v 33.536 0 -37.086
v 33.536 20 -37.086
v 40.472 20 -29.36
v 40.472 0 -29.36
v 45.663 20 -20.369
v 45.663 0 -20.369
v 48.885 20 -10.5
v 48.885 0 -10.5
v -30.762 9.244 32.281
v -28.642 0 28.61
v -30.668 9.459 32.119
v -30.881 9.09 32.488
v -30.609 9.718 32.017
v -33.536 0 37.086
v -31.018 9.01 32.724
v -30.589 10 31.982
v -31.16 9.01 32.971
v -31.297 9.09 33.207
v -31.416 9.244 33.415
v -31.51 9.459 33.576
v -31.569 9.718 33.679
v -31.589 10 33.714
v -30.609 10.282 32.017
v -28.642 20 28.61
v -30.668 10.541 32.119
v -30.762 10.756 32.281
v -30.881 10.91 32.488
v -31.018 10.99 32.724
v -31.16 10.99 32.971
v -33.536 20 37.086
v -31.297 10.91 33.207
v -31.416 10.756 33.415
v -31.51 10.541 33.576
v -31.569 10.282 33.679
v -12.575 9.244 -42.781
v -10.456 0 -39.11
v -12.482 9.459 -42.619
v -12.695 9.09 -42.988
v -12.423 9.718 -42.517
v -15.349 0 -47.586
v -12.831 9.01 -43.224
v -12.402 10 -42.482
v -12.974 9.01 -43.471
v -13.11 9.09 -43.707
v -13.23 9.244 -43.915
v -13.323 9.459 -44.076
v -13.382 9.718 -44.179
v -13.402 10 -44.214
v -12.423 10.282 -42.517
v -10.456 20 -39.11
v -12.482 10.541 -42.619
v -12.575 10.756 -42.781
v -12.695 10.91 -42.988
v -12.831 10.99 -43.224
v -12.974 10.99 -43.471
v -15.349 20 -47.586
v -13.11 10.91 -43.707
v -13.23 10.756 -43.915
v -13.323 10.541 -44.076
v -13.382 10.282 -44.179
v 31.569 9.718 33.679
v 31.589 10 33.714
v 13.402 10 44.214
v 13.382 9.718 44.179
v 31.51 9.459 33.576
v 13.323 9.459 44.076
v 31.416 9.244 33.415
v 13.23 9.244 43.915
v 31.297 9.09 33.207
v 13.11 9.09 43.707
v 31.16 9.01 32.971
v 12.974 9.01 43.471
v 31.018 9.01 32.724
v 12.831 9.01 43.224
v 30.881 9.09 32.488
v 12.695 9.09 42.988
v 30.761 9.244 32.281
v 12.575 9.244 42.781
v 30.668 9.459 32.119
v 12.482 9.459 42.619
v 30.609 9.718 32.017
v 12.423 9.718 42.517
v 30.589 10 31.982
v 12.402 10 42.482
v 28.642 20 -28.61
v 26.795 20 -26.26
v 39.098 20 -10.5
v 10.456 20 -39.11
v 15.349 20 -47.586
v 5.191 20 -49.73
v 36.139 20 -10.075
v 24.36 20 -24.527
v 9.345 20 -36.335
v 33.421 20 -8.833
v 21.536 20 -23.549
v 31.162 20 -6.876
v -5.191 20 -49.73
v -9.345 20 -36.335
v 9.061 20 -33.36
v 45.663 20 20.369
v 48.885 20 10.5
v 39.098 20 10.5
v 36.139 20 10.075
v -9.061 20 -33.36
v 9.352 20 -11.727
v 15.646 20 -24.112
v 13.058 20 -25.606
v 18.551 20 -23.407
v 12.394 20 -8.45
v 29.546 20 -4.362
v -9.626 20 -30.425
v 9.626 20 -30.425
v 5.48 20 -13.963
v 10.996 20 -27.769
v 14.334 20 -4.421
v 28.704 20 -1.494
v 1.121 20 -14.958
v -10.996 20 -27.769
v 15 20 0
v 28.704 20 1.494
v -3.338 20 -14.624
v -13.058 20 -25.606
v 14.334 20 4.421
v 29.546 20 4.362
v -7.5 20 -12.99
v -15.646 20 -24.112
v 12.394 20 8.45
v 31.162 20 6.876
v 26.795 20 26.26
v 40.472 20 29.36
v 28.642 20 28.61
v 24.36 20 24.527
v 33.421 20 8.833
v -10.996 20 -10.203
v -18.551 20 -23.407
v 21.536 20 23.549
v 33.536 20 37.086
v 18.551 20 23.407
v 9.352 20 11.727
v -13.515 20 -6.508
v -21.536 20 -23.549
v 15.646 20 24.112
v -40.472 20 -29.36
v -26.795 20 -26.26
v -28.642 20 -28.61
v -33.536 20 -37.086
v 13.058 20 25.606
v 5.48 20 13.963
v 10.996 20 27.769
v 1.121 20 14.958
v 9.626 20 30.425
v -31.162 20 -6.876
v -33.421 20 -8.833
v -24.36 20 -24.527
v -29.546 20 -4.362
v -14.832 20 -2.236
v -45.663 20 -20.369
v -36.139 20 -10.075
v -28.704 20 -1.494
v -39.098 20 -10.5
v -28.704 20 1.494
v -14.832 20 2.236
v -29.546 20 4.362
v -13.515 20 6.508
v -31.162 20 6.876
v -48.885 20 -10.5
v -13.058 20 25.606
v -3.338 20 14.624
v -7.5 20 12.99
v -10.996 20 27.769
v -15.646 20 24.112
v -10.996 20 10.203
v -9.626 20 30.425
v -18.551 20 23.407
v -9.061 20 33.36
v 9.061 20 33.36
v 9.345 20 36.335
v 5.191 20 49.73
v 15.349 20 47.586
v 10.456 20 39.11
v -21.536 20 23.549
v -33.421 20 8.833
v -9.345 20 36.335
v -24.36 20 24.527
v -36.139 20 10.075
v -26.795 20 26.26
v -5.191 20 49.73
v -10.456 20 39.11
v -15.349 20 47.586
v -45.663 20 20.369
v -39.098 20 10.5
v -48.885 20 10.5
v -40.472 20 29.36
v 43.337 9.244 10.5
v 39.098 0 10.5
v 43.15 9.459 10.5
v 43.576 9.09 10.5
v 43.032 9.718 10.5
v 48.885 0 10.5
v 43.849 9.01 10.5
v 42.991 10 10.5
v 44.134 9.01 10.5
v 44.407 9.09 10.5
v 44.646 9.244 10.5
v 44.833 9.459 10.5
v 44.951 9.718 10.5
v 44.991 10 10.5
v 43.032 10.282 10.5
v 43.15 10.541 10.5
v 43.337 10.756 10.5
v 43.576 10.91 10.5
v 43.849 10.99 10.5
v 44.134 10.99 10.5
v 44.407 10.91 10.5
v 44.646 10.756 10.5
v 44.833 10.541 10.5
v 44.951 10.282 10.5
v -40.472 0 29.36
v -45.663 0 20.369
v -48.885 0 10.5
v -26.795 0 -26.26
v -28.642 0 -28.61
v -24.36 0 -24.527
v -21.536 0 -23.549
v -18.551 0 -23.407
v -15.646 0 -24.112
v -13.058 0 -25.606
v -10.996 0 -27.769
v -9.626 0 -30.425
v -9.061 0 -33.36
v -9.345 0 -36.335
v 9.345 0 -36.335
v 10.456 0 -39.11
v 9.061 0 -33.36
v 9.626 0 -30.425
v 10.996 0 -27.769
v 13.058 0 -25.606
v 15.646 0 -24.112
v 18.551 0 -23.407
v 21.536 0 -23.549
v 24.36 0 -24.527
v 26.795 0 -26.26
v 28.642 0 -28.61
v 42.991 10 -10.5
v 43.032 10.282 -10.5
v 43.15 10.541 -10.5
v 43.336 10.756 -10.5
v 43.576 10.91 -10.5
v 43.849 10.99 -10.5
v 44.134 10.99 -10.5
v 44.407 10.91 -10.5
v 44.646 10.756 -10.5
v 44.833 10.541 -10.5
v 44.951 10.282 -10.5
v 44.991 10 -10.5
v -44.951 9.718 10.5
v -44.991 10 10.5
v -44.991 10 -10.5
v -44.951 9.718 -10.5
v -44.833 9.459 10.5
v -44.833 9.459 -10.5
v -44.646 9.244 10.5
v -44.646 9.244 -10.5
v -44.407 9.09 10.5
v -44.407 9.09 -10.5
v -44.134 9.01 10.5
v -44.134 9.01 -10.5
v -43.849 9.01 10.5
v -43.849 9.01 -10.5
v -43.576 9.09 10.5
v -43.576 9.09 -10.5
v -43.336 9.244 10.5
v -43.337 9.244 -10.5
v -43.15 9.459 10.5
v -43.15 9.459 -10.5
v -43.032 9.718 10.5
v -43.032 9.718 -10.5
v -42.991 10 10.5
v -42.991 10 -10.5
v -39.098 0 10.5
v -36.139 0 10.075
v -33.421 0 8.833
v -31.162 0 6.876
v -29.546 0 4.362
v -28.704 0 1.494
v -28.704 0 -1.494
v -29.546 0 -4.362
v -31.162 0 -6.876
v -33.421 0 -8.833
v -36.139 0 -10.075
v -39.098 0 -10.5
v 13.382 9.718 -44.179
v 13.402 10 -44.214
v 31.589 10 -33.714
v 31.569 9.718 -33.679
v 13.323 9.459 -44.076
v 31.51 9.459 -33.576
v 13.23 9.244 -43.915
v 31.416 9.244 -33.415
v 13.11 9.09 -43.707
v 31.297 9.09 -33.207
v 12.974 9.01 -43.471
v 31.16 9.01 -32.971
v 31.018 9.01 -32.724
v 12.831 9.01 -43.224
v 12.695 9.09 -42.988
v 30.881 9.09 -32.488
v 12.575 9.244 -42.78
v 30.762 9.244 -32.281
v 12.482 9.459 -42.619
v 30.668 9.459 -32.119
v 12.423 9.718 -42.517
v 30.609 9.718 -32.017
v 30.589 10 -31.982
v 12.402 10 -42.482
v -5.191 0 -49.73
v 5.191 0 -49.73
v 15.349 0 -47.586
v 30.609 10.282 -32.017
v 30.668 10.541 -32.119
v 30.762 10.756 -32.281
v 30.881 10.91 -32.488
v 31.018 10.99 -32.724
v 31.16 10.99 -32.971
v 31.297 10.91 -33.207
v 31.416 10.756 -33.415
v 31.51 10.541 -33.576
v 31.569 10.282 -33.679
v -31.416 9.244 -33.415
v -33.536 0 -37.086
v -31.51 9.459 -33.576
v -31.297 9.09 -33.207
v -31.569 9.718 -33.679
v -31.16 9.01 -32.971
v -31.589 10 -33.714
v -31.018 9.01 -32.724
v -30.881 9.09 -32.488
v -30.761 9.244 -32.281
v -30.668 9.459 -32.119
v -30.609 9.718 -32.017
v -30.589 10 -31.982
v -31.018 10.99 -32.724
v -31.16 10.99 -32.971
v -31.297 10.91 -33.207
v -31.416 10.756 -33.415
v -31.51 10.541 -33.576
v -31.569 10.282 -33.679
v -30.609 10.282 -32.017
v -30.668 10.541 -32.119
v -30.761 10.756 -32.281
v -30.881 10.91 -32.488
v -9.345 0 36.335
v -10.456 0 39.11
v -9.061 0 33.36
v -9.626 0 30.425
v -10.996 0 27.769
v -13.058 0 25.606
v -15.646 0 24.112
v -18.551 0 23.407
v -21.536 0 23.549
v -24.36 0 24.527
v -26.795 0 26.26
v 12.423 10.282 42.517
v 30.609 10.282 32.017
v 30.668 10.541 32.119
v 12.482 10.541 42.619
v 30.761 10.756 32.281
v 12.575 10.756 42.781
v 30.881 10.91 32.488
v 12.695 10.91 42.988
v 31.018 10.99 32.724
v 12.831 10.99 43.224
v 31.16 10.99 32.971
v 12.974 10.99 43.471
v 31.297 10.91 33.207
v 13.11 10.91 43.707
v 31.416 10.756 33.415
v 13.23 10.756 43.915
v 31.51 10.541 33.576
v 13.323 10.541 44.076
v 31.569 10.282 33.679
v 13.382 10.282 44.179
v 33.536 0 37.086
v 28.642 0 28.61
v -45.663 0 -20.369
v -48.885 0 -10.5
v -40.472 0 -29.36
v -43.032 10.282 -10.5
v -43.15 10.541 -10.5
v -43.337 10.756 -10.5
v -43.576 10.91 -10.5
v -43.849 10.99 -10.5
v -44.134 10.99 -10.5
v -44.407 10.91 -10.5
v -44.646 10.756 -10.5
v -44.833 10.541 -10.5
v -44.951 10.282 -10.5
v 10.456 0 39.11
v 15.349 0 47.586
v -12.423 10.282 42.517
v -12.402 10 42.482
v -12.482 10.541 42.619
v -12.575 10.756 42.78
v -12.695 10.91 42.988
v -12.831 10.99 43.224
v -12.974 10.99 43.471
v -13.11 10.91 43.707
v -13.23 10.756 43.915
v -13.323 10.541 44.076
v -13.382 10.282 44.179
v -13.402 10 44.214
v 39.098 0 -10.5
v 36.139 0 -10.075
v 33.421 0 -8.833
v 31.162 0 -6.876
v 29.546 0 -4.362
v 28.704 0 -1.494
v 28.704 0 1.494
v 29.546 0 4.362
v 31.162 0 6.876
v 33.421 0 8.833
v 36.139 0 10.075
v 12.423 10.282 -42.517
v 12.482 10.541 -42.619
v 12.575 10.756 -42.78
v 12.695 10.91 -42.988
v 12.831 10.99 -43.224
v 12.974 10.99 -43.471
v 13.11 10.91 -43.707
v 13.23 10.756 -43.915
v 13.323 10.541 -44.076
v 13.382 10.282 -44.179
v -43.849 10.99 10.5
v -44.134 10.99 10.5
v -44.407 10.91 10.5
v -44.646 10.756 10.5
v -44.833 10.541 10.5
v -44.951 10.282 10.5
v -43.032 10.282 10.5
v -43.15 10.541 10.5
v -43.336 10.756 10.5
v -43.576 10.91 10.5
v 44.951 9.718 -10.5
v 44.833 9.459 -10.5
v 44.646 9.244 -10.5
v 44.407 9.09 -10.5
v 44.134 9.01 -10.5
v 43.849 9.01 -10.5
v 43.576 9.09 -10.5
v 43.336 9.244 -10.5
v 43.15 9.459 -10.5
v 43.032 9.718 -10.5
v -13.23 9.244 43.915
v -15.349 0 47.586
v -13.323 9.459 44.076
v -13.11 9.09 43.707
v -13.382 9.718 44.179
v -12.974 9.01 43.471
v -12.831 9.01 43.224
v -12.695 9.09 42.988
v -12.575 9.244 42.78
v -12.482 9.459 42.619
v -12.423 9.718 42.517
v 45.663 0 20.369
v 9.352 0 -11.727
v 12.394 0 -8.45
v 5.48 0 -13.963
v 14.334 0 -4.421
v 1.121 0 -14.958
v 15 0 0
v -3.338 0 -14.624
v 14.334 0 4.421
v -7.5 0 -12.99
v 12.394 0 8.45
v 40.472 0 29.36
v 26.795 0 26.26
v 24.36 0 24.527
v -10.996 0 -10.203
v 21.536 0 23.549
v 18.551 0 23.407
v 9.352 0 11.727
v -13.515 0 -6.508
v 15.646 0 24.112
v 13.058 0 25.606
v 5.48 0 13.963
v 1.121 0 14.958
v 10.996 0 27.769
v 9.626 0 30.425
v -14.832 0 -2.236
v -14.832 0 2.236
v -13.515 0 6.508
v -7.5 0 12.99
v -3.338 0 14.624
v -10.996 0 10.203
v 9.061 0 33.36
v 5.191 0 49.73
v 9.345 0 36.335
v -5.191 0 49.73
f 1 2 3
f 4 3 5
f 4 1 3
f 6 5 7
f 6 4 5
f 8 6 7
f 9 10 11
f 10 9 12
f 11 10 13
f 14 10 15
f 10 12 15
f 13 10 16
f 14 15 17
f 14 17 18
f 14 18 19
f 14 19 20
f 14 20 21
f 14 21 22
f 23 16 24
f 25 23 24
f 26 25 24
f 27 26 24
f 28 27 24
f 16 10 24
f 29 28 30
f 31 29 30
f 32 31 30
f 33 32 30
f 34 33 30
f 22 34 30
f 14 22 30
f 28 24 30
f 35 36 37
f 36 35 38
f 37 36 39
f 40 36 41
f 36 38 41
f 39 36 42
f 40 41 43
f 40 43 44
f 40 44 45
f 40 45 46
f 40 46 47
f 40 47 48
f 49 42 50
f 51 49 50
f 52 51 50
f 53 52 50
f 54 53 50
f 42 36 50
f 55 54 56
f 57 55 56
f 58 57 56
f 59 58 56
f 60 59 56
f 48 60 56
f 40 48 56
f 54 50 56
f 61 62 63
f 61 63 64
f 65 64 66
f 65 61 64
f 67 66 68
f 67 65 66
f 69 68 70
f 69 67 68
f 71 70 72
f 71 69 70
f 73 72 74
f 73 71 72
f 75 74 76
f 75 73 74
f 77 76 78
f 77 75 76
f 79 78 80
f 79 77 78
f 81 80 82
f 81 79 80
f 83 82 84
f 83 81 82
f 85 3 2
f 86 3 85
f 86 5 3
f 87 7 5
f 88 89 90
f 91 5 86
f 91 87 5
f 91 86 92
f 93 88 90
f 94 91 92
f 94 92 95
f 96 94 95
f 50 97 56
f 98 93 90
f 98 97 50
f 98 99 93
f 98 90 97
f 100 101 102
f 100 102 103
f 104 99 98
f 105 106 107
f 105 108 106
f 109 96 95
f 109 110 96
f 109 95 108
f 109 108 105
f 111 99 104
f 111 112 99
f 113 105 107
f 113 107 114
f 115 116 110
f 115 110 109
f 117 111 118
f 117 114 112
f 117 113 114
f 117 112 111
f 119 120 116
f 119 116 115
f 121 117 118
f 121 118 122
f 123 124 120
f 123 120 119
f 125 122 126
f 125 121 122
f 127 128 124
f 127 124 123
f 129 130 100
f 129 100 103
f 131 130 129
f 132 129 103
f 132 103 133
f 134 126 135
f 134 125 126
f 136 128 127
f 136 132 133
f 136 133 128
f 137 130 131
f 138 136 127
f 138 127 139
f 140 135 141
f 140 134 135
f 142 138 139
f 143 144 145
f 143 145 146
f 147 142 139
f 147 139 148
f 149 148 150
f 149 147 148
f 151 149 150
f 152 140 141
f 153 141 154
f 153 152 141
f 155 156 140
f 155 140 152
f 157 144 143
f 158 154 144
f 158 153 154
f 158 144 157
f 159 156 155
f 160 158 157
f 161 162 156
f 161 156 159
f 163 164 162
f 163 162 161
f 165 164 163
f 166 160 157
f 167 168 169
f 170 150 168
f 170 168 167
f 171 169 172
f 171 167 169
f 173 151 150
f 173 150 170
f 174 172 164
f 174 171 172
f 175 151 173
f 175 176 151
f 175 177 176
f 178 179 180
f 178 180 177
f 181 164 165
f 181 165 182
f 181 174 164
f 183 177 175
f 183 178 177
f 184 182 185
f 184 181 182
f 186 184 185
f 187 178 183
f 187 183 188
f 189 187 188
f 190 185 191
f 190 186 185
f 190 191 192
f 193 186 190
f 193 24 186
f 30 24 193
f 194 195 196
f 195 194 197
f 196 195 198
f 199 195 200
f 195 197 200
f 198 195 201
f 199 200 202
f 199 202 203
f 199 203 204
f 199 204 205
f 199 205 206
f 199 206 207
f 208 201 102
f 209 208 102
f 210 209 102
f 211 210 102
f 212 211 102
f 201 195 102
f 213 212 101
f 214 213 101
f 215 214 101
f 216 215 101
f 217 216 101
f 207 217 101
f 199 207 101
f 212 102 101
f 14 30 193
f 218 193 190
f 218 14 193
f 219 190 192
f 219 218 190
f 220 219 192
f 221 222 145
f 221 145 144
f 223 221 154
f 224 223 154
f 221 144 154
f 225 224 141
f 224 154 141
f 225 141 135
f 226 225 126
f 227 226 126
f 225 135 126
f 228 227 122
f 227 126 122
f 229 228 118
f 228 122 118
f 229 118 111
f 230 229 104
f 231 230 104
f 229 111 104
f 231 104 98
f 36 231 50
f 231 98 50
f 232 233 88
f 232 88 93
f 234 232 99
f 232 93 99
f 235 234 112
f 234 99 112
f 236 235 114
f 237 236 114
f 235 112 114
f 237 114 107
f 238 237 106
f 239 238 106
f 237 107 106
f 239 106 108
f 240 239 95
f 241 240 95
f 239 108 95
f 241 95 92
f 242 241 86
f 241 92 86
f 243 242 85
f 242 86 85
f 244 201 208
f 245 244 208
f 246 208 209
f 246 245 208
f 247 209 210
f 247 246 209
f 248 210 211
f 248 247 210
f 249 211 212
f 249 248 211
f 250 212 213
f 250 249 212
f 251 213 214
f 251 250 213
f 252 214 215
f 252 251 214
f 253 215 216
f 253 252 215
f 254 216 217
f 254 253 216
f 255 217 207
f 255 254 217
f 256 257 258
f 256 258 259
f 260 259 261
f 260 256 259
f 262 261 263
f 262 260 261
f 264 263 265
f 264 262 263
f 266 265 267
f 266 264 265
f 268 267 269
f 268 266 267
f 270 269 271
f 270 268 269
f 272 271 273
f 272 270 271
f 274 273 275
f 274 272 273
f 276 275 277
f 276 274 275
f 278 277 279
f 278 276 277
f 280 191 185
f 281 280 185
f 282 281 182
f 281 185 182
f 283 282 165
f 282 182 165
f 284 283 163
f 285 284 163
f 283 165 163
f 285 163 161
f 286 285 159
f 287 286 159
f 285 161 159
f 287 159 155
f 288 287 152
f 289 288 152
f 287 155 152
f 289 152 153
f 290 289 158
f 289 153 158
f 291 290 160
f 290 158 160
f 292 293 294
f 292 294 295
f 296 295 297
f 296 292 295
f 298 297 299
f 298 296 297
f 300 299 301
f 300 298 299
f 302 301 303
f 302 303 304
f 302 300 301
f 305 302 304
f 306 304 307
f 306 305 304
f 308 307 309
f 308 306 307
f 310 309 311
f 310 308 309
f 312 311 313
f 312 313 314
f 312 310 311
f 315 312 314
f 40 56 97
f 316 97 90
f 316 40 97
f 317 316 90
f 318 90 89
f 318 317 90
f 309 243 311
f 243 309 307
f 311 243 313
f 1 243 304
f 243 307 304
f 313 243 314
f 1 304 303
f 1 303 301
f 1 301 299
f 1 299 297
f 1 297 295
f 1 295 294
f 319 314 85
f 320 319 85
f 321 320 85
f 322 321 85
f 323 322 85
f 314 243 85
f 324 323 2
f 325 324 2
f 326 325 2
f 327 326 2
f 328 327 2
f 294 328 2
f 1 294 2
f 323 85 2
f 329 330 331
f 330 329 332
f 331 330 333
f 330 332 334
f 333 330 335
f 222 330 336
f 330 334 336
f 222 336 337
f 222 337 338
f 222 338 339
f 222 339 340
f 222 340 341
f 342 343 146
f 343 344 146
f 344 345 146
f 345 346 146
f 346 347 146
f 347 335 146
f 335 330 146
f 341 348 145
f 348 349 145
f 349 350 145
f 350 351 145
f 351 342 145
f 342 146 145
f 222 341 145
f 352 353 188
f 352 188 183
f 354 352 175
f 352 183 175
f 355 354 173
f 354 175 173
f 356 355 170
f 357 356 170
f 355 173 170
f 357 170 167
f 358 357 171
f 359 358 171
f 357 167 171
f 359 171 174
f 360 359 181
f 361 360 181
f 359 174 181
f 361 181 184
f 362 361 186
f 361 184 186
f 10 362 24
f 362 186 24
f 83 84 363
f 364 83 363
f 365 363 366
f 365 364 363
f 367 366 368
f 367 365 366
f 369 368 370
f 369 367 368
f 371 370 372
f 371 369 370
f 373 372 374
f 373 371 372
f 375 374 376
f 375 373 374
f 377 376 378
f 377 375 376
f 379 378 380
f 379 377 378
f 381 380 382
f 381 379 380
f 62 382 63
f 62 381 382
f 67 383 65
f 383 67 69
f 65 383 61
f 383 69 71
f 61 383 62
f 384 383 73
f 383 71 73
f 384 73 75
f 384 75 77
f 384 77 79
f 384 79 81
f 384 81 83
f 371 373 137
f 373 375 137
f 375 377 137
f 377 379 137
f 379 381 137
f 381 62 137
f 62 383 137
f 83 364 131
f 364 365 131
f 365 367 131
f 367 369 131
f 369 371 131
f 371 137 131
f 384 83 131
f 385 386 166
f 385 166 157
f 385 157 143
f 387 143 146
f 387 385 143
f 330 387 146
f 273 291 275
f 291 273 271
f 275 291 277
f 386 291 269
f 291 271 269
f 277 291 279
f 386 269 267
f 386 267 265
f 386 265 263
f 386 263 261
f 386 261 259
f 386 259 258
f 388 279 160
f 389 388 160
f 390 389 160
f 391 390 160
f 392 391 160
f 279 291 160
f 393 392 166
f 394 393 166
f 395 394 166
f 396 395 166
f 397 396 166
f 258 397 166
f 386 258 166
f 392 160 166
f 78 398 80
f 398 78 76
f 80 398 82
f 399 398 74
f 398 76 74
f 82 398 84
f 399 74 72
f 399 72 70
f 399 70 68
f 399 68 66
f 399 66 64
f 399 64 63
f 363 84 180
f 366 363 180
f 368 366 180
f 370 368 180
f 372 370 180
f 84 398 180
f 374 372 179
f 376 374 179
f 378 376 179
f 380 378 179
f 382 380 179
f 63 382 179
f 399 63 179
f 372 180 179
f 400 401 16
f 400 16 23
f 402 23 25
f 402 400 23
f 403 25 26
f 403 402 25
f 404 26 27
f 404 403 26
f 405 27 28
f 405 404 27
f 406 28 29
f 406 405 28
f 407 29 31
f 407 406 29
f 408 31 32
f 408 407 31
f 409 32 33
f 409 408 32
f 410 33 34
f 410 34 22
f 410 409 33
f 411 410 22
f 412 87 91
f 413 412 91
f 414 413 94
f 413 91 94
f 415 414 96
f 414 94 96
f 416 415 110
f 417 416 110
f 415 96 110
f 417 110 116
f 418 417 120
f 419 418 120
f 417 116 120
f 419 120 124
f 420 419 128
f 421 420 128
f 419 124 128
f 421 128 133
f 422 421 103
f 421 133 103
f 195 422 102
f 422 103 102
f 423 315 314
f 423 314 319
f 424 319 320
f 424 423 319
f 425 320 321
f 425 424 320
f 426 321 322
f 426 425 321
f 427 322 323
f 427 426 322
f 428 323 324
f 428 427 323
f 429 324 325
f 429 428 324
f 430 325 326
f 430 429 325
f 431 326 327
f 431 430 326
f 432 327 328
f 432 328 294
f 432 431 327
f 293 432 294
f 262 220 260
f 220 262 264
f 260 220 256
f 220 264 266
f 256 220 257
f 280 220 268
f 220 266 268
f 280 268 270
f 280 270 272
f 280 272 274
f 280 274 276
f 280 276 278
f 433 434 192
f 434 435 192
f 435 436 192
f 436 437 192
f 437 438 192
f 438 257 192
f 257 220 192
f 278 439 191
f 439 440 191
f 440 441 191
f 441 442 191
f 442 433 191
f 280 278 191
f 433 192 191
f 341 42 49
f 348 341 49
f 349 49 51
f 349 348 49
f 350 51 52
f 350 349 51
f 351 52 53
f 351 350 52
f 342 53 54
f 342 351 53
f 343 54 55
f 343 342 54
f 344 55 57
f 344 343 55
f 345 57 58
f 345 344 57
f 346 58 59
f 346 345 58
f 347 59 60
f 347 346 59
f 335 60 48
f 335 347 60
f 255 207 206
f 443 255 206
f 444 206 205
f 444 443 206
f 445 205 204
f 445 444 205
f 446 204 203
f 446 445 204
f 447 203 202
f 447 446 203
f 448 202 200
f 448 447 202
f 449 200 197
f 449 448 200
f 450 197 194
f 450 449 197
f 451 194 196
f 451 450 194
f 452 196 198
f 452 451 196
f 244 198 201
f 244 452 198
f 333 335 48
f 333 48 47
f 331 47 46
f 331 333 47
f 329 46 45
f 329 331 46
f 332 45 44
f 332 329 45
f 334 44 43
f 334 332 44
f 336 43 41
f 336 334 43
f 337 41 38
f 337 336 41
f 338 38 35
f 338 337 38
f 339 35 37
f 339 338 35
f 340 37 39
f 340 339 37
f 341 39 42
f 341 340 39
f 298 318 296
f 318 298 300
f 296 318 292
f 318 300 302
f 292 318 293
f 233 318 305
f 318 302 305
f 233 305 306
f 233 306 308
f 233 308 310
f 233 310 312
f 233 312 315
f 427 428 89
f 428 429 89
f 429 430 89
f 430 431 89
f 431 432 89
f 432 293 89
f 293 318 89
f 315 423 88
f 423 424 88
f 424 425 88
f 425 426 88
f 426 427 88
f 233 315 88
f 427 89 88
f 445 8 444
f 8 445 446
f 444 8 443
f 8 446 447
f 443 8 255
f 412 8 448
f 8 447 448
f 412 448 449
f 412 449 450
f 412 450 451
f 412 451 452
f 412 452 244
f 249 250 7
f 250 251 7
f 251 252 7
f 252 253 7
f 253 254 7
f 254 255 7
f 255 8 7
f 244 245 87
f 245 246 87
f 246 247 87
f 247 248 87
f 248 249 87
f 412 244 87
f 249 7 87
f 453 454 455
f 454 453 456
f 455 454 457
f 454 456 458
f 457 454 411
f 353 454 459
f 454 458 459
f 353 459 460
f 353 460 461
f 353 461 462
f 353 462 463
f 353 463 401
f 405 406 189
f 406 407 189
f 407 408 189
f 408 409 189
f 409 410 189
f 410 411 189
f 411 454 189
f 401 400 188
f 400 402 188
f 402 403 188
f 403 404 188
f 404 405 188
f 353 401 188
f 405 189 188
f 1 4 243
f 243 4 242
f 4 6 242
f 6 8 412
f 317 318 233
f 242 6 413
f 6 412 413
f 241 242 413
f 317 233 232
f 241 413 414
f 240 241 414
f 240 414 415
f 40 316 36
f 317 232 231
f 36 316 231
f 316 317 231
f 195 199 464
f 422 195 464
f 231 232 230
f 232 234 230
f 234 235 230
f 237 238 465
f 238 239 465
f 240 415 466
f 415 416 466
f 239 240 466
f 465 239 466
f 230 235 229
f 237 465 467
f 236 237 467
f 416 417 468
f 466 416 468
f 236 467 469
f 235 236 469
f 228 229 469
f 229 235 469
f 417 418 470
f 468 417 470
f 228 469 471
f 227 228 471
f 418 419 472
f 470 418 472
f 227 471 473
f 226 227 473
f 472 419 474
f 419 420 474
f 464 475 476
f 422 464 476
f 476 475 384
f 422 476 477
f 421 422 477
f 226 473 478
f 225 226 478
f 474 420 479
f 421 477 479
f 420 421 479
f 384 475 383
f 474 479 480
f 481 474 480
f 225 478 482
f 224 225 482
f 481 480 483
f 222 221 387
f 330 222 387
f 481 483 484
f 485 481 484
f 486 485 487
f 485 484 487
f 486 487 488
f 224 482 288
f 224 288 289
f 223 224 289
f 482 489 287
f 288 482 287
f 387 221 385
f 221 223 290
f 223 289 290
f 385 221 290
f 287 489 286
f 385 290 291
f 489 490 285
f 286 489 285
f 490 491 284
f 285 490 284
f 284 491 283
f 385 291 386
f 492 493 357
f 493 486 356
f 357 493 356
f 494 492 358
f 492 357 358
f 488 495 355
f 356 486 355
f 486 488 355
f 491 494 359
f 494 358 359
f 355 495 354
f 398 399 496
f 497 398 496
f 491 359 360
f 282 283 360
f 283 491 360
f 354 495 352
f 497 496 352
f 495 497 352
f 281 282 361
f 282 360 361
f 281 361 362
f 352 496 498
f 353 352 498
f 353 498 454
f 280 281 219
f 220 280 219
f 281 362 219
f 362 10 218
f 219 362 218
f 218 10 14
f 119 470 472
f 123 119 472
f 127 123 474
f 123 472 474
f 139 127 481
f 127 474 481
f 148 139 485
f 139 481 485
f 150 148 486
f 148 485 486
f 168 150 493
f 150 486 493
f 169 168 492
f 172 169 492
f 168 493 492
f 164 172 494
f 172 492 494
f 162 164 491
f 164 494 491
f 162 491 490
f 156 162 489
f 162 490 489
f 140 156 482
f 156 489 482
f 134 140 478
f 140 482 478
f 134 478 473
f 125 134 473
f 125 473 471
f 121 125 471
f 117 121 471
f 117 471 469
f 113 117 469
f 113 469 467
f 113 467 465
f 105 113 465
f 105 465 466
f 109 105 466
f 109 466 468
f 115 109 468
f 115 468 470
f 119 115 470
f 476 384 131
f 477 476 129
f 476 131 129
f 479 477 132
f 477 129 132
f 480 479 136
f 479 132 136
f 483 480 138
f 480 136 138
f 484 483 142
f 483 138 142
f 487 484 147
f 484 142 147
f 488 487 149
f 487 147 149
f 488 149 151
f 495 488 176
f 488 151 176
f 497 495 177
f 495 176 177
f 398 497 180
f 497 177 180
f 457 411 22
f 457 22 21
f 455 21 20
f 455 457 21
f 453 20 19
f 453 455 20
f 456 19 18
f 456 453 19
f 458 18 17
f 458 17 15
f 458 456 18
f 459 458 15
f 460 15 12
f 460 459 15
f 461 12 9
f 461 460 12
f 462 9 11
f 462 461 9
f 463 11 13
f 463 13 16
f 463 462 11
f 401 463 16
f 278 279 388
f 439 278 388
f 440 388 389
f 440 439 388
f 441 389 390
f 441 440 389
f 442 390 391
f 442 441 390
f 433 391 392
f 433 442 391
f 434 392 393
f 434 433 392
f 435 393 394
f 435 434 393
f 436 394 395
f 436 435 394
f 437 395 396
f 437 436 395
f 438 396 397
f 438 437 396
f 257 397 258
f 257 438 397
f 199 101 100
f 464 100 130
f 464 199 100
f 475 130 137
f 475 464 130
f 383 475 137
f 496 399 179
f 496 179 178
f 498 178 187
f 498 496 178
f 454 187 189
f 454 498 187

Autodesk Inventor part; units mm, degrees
ref_plane "YZ Plane" through (0, 0, 0) normal (1, 0, 0) x (0, 1, 0)
ref_plane "XY Plane" through (0, 0, 0) normal (0, 0, 1) x (1, 0, 0)
sketch "Sketch1" plane through (0, 0, 0) normal (0, 1, 0) x (-1, 0, 0)
  circle A0 centre (0, 0) radius 50
  dimension "d0" = 100
extrude "Extrusion1" add sketch "Sketch1" along normal blind 20
sketch "Sketch2" plane through (0, 20, 0) normal (0, 1, 0) x (1, 0, 0)
  line L0 (60.9024, 0) -> (39.0976, 0) construction
  circle A0 centre (0, 0) radius 50 projected
  line L1 (60.9024, 10.5) -> (39.0976, 10.5)
  line L2 (39.0976, -10.5) -> (60.9024, -10.5)
  arc A1 (60.9024, -10.5) -> (60.9024, 10.5) centre (60.9024, 0) ccw
  arc A2 (39.0976, 10.5) -> (39.0976, -10.5) centre (39.0976, 0) ccw
  point P0 (50, 0)
  dimension "d3" = 21
extrude "Extrusion2" cut sketch "Sketch2" against normal blind 20 contours A0 L2 A2 L1 | A0 L1 A1 L2 picked at (42.7317, 0)
pattern_circular "Circular Pattern1" count 6 over 360 about axis through (0, -10, 0) along (0, 1, 0) of "Extrusion2"
sketch "Sketch3" plane through (48.8851, 20, 10.5) normal (0, 0, -1) x (-1, 0, 0)
  point P0 (48.8851, -20)
sketch "Sketch4" plane through (0, 20, 0) normal (0, 1, 0) x (1, 0, 0)
  point P0 (0, 0)
ref_plane "Work Plane1" through (0, 10, 0) normal (0, 1, 0) x (-1, 0, 0)
sketch "Sketch5" plane through (0, 10, 0) normal (0, 1, 0) x (-1, 0, 0)
  line L0 (-15.3493, 47.5857) -> (-10.4555, 39.1095) projected
  arc A0 (-28.6421, 28.6095) -> (-10.4555, 39.1095) centre (-19.5488, 33.8595) ccw projected
  line L1 (-28.6421, 28.6095) -> (-33.5358, 37.0857) projected
  arc A1 (-33.5358, 37.0857) -> (-48.8851, 10.5) centre (0, 0) ccw projected
  line L2 (-48.8851, 10.5) -> (-39.0976, 10.5) projected
  arc A2 (-39.0976, -10.5) -> (-39.0976, 10.5) centre (-39.0976, 0) ccw projected
  line L3 (-39.0976, -10.5) -> (-48.8851, -10.5) projected
  arc A3 (-48.8851, -10.5) -> (-33.5358, -37.0857) centre (0, 0) ccw projected
  line L4 (-33.5358, -37.0857) -> (-28.6421, -28.6095) projected
  arc A4 (-10.4555, -39.1095) -> (-28.6421, -28.6095) centre (-19.5488, -33.8595) ccw projected
  line L5 (-10.4555, -39.1095) -> (-15.3493, -47.5857) projected
  arc A5 (-15.3493, -47.5857) -> (15.3493, -47.5857) centre (0, 0) ccw projected
  line L6 (15.3493, -47.5857) -> (10.4555, -39.1095) projected
  arc A6 (28.6421, -28.6095) -> (10.4555, -39.1095) centre (19.5488, -33.8595) ccw projected
  line L7 (28.6421, -28.6095) -> (33.5358, -37.0857) projected
  arc A7 (33.5358, -37.0857) -> (48.8851, -10.5) centre (0, 0) ccw projected
  line L8 (48.8851, -10.5) -> (39.0976, -10.5) projected
  arc A8 (39.0976, 10.5) -> (39.0976, -10.5) centre (39.0976, 0) ccw projected
  line L9 (39.0976, 10.5) -> (48.8851, 10.5) projected
  arc A9 (48.8851, 10.5) -> (33.5358, 37.0857) centre (0, 0) ccw projected
  line L10 (33.5358, 37.0857) -> (28.6421, 28.6095) projected
  arc A10 (10.4555, 39.1095) -> (28.6421, 28.6095) centre (19.5488, 33.8595) ccw projected
  line L11 (10.4555, 39.1095) -> (15.3493, 47.5857) projected
  arc A11 (15.3493, 47.5857) -> (-15.3493, 47.5857) centre (0, 0) ccw projected
  line L12 (15.3493, -47.5857) -> (10.4555, -39.1095) projected
  line L13 (12.9024, -43.3476) -> (31.0889, -32.8476)
  line L14 (28.6421, -28.6095) -> (33.5358, -37.0857) projected
  line L15 (43.9913, -10.5) -> (43.9913, 10.5)
  line L16 (31.0889, 32.8476) -> (12.9024, 43.3476)
  line L17 (15.3493, 47.5857) -> (10.4555, 39.1095) projected
  line L18 (-10.4555, 39.1095) -> (-15.3493, 47.5857) projected
  line L19 (-12.9024, 43.3476) -> (-31.0889, 32.8476)
  line L20 (-39.0976, 10.5) -> (-48.8851, 10.5) projected
  line L21 (-43.9913, 10.5) -> (-43.9913, -10.5)
  line L22 (-28.6421, -28.6095) -> (-33.5358, -37.0857) projected
  line L23 (-31.0889, -32.8476) -> (-12.9024, -43.3476)
  line L24 (-15.3493, -47.5857) -> (-10.4555, -39.1095) projected
sketch "Sketch6" plane through (-15.3493, 0, 47.5857) normal (-0.866, 0, -0.5) x (-0.5, 0, 0.866)
  point P0 (-48.8851, 0)
sketch "Sketch7" plane through (15.3493, 0, 47.5857) normal (0.866, 0, -0.5) x (-0.5, 0, -0.866)
  line L0 (0, 10) -> (9.7874, 10) projected
  circle A0 centre (4.8937, 10) radius 1
  point P0 (48.8851, 0)
  dimension "d10" = 2
sweep "Sweep1" add profiles "Sketch7" path "Sketch5" path curves L19
pattern_circular "Circular Pattern2" count 6 over 360 about axis through (0, -10, 0) along (0, 1, 0) of "Sweep1"
sketch "Sketch8" plane through (0, 0, 0) normal (0, -1, 0) x (1, 0, 0)
  circle A0 centre (0, 0) radius 15
  dimension "d16" = 30
extrude "Extrusion3" cut sketch "Sketch8" against normal up to next
properties part number "Holder"
